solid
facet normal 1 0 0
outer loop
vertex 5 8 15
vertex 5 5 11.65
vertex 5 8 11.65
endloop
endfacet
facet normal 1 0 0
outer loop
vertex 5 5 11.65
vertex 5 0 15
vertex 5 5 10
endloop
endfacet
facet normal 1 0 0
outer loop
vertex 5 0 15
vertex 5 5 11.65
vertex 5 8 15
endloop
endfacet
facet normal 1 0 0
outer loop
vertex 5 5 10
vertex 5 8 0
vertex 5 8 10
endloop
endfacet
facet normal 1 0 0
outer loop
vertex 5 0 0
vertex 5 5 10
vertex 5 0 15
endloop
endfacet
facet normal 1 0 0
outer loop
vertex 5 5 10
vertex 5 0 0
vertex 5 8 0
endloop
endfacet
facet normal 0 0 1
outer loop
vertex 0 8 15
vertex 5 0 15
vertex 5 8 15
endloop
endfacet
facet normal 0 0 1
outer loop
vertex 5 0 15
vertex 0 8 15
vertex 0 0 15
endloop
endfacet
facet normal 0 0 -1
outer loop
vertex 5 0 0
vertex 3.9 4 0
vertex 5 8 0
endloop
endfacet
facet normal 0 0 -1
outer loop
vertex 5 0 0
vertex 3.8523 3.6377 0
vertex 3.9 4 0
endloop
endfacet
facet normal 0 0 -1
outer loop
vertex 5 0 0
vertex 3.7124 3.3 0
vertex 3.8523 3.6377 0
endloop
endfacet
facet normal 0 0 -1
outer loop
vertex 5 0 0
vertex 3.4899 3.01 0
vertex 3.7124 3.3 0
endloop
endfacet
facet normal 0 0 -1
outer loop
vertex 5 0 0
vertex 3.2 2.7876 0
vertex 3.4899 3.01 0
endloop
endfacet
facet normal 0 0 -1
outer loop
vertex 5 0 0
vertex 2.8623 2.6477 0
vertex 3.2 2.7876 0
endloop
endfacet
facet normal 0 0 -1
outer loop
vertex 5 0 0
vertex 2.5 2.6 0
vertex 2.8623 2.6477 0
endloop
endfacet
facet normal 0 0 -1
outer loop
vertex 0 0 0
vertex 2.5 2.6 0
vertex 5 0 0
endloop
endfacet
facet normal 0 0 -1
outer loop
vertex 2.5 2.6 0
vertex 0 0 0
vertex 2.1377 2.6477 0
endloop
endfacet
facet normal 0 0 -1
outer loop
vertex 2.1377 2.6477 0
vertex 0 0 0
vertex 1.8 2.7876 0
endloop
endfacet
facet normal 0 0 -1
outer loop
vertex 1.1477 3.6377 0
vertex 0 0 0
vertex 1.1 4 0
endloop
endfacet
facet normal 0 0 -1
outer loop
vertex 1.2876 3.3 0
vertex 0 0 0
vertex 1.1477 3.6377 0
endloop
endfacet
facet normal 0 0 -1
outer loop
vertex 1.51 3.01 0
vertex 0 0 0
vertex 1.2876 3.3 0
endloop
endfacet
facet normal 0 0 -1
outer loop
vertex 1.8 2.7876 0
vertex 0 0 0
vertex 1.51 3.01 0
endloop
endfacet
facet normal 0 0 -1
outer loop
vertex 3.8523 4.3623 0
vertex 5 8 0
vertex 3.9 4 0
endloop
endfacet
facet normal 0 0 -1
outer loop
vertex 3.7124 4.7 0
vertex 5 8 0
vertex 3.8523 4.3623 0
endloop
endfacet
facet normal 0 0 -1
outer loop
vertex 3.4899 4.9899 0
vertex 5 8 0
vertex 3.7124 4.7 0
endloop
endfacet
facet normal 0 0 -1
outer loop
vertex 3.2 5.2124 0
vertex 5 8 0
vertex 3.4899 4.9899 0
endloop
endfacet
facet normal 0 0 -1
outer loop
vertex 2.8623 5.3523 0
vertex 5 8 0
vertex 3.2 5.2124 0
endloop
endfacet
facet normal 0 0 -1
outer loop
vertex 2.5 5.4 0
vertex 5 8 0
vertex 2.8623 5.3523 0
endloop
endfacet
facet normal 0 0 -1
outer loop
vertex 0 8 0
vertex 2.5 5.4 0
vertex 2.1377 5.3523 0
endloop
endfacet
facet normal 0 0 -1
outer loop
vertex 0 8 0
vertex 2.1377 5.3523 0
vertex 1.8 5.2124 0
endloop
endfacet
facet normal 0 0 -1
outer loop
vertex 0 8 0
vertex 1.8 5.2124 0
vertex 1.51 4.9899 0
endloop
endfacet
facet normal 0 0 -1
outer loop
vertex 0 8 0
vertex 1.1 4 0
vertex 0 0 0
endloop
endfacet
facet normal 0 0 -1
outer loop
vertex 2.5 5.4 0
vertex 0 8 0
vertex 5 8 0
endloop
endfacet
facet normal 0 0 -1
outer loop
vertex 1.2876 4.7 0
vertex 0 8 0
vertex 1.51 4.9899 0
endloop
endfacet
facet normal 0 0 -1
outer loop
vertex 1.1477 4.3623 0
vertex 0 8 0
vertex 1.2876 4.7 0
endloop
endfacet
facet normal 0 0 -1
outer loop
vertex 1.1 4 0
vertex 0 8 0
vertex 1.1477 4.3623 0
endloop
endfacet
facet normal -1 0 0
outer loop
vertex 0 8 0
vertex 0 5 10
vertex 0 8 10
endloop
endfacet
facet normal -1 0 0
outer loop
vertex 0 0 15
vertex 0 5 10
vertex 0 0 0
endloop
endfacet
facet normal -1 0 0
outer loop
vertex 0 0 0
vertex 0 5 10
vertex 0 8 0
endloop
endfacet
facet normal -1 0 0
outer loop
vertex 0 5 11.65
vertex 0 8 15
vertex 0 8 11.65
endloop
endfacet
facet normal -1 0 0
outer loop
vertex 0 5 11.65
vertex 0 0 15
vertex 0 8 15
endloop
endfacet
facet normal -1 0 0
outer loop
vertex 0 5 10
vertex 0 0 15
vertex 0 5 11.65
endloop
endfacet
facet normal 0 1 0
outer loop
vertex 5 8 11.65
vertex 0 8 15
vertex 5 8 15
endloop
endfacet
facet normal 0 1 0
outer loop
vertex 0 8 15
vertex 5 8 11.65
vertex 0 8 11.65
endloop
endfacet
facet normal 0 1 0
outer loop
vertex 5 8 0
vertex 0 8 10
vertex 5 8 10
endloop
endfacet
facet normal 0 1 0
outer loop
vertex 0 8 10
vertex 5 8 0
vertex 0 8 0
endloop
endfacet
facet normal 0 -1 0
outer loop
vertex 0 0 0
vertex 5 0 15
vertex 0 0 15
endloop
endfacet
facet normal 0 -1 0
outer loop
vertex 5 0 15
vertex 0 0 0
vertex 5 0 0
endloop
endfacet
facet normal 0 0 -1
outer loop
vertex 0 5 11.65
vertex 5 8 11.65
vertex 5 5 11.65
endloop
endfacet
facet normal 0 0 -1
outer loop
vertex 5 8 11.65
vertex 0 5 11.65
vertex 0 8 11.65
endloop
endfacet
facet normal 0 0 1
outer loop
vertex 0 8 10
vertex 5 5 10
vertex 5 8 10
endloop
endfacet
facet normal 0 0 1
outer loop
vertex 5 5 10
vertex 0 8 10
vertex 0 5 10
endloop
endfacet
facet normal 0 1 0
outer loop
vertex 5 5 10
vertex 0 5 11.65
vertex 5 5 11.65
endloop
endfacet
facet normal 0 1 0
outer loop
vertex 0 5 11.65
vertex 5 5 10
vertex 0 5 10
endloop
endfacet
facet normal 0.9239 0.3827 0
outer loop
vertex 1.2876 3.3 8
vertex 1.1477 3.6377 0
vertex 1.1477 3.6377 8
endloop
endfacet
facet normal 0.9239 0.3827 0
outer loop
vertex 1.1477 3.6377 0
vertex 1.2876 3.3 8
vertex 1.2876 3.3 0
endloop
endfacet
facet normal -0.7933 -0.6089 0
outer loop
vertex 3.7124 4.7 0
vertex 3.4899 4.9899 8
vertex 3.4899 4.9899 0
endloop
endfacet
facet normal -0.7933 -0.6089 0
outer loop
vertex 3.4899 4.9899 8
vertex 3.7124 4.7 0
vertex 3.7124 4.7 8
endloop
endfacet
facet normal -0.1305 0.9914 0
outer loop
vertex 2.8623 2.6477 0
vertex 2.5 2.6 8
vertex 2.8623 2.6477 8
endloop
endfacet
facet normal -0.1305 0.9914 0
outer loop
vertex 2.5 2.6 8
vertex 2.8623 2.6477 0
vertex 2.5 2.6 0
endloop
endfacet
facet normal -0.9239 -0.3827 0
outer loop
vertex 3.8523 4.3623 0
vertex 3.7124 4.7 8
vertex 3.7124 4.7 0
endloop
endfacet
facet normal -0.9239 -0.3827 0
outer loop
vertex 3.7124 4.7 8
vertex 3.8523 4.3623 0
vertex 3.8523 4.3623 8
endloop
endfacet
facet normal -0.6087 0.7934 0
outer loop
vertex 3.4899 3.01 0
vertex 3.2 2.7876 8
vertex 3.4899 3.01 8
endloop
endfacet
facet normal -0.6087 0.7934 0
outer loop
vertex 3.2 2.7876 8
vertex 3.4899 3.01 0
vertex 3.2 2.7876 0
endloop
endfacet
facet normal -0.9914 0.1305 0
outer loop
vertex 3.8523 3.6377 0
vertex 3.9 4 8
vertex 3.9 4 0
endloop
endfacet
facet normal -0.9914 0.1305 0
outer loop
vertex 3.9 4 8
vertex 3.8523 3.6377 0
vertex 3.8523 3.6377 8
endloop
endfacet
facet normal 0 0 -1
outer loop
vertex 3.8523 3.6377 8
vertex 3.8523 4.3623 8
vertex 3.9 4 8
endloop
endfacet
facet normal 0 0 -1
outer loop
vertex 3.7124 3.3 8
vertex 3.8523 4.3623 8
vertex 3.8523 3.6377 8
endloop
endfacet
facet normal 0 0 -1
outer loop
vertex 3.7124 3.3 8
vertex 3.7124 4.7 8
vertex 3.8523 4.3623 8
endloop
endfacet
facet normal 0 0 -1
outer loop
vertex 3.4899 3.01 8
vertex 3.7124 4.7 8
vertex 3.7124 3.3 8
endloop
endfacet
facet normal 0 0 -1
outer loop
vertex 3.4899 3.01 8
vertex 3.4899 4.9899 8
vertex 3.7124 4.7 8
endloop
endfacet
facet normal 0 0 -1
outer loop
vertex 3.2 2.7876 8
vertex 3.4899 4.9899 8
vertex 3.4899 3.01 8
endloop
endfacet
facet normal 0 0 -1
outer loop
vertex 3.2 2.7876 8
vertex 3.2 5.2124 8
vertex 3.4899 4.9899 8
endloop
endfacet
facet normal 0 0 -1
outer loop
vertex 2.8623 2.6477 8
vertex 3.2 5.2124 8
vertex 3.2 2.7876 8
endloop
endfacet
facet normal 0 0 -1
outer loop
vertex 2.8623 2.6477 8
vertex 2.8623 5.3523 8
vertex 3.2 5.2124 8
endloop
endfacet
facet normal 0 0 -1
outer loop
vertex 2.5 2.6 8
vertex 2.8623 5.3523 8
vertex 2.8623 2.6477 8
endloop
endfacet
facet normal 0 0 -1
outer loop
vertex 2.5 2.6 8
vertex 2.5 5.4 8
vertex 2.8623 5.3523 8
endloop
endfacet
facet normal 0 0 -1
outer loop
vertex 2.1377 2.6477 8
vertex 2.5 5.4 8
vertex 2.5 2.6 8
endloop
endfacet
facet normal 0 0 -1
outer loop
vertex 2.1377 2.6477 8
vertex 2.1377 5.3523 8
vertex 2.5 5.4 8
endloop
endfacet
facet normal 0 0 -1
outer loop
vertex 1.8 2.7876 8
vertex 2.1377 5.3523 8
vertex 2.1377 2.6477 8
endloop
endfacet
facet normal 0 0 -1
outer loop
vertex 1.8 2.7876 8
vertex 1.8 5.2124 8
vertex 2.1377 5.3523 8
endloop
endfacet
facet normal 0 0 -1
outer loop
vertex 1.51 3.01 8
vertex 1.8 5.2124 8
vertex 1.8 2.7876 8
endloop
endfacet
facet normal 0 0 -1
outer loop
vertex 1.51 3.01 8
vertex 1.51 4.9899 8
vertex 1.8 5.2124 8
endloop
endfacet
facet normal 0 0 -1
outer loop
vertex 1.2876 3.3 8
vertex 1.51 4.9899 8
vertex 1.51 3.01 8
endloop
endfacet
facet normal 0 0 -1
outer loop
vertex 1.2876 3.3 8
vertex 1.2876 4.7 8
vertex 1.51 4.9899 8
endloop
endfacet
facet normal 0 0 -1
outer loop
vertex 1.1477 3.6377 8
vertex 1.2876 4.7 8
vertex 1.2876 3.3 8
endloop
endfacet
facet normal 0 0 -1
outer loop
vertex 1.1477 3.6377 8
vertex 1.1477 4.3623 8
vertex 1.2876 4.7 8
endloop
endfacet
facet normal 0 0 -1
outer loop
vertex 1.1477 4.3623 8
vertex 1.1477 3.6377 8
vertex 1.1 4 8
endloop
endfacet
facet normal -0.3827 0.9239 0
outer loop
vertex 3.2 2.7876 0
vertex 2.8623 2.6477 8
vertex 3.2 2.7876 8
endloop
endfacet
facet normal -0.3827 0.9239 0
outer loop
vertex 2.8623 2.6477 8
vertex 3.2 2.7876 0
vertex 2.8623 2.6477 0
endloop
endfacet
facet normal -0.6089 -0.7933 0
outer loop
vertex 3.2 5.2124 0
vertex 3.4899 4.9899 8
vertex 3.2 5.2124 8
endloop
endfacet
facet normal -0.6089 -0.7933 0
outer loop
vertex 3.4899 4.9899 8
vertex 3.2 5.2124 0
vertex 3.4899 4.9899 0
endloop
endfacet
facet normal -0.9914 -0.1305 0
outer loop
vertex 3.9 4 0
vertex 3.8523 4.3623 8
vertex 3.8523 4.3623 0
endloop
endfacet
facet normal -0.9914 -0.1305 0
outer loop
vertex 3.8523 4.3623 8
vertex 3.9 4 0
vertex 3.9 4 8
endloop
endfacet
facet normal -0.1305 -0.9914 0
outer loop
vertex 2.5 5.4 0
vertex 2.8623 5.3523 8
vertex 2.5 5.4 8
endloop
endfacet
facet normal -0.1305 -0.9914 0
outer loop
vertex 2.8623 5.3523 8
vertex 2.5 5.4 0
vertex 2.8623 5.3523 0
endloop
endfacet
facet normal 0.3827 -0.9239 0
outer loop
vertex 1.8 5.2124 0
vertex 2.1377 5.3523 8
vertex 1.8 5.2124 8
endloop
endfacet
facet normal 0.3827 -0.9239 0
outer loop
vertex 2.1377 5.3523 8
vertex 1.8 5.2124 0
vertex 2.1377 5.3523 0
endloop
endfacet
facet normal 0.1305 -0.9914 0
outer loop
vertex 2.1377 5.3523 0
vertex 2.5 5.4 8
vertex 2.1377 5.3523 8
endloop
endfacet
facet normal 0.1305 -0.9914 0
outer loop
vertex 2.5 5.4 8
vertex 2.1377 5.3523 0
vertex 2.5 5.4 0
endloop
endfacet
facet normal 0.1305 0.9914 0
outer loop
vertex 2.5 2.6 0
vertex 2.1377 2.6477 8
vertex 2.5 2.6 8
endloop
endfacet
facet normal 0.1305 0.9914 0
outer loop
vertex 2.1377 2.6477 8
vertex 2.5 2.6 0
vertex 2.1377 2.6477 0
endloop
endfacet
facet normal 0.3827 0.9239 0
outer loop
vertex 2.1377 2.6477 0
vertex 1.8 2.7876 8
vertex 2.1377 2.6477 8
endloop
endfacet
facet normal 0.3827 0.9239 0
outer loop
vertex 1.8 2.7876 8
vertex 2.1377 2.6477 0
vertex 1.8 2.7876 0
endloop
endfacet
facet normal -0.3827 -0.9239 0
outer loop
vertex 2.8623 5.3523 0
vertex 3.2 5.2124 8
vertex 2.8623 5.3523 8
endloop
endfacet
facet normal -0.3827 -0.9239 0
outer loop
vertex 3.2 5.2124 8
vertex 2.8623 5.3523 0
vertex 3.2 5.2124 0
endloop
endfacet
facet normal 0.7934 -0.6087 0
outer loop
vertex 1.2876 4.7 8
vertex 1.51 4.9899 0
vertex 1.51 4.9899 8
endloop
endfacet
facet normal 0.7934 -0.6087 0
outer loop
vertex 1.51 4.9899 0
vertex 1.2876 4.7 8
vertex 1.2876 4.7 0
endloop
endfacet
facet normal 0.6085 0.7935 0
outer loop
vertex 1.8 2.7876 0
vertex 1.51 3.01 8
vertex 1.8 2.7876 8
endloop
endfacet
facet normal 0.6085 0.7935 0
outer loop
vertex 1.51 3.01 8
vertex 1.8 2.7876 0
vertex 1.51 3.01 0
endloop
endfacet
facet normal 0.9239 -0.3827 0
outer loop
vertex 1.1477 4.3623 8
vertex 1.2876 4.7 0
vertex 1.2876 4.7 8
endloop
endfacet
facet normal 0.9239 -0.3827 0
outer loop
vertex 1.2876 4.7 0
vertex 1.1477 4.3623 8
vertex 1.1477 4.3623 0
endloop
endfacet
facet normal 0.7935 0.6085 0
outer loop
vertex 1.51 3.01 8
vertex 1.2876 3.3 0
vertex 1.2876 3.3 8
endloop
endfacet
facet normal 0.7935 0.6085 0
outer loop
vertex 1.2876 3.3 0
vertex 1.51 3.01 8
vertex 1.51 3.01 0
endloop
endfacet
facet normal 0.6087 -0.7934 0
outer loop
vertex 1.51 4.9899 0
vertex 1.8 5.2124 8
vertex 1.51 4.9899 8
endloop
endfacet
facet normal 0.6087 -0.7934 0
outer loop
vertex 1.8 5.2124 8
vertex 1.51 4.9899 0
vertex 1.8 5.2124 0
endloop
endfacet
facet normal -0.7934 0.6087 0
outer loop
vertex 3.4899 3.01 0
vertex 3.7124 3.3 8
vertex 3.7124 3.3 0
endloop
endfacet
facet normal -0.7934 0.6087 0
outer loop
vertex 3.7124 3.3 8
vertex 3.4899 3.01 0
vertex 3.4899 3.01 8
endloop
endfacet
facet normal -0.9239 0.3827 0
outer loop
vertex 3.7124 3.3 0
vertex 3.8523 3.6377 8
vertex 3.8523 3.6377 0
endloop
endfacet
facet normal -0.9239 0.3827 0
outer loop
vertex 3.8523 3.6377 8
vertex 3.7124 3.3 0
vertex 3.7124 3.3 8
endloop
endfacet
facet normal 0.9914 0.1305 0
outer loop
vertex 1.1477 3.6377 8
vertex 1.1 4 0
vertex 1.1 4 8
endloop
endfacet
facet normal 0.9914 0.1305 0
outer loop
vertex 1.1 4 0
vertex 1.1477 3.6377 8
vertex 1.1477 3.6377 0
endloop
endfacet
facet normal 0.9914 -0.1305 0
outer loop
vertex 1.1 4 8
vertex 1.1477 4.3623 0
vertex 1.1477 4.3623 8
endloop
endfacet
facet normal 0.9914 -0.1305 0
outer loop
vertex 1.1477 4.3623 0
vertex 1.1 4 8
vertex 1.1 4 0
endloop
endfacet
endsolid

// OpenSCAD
difference(){
cube([5,8,15]);
translate([0,5,10])cube([5,10,1.65]);
translate([2.5,4,0])cylinder(d=2.8,h=8,$fn=24);
}
